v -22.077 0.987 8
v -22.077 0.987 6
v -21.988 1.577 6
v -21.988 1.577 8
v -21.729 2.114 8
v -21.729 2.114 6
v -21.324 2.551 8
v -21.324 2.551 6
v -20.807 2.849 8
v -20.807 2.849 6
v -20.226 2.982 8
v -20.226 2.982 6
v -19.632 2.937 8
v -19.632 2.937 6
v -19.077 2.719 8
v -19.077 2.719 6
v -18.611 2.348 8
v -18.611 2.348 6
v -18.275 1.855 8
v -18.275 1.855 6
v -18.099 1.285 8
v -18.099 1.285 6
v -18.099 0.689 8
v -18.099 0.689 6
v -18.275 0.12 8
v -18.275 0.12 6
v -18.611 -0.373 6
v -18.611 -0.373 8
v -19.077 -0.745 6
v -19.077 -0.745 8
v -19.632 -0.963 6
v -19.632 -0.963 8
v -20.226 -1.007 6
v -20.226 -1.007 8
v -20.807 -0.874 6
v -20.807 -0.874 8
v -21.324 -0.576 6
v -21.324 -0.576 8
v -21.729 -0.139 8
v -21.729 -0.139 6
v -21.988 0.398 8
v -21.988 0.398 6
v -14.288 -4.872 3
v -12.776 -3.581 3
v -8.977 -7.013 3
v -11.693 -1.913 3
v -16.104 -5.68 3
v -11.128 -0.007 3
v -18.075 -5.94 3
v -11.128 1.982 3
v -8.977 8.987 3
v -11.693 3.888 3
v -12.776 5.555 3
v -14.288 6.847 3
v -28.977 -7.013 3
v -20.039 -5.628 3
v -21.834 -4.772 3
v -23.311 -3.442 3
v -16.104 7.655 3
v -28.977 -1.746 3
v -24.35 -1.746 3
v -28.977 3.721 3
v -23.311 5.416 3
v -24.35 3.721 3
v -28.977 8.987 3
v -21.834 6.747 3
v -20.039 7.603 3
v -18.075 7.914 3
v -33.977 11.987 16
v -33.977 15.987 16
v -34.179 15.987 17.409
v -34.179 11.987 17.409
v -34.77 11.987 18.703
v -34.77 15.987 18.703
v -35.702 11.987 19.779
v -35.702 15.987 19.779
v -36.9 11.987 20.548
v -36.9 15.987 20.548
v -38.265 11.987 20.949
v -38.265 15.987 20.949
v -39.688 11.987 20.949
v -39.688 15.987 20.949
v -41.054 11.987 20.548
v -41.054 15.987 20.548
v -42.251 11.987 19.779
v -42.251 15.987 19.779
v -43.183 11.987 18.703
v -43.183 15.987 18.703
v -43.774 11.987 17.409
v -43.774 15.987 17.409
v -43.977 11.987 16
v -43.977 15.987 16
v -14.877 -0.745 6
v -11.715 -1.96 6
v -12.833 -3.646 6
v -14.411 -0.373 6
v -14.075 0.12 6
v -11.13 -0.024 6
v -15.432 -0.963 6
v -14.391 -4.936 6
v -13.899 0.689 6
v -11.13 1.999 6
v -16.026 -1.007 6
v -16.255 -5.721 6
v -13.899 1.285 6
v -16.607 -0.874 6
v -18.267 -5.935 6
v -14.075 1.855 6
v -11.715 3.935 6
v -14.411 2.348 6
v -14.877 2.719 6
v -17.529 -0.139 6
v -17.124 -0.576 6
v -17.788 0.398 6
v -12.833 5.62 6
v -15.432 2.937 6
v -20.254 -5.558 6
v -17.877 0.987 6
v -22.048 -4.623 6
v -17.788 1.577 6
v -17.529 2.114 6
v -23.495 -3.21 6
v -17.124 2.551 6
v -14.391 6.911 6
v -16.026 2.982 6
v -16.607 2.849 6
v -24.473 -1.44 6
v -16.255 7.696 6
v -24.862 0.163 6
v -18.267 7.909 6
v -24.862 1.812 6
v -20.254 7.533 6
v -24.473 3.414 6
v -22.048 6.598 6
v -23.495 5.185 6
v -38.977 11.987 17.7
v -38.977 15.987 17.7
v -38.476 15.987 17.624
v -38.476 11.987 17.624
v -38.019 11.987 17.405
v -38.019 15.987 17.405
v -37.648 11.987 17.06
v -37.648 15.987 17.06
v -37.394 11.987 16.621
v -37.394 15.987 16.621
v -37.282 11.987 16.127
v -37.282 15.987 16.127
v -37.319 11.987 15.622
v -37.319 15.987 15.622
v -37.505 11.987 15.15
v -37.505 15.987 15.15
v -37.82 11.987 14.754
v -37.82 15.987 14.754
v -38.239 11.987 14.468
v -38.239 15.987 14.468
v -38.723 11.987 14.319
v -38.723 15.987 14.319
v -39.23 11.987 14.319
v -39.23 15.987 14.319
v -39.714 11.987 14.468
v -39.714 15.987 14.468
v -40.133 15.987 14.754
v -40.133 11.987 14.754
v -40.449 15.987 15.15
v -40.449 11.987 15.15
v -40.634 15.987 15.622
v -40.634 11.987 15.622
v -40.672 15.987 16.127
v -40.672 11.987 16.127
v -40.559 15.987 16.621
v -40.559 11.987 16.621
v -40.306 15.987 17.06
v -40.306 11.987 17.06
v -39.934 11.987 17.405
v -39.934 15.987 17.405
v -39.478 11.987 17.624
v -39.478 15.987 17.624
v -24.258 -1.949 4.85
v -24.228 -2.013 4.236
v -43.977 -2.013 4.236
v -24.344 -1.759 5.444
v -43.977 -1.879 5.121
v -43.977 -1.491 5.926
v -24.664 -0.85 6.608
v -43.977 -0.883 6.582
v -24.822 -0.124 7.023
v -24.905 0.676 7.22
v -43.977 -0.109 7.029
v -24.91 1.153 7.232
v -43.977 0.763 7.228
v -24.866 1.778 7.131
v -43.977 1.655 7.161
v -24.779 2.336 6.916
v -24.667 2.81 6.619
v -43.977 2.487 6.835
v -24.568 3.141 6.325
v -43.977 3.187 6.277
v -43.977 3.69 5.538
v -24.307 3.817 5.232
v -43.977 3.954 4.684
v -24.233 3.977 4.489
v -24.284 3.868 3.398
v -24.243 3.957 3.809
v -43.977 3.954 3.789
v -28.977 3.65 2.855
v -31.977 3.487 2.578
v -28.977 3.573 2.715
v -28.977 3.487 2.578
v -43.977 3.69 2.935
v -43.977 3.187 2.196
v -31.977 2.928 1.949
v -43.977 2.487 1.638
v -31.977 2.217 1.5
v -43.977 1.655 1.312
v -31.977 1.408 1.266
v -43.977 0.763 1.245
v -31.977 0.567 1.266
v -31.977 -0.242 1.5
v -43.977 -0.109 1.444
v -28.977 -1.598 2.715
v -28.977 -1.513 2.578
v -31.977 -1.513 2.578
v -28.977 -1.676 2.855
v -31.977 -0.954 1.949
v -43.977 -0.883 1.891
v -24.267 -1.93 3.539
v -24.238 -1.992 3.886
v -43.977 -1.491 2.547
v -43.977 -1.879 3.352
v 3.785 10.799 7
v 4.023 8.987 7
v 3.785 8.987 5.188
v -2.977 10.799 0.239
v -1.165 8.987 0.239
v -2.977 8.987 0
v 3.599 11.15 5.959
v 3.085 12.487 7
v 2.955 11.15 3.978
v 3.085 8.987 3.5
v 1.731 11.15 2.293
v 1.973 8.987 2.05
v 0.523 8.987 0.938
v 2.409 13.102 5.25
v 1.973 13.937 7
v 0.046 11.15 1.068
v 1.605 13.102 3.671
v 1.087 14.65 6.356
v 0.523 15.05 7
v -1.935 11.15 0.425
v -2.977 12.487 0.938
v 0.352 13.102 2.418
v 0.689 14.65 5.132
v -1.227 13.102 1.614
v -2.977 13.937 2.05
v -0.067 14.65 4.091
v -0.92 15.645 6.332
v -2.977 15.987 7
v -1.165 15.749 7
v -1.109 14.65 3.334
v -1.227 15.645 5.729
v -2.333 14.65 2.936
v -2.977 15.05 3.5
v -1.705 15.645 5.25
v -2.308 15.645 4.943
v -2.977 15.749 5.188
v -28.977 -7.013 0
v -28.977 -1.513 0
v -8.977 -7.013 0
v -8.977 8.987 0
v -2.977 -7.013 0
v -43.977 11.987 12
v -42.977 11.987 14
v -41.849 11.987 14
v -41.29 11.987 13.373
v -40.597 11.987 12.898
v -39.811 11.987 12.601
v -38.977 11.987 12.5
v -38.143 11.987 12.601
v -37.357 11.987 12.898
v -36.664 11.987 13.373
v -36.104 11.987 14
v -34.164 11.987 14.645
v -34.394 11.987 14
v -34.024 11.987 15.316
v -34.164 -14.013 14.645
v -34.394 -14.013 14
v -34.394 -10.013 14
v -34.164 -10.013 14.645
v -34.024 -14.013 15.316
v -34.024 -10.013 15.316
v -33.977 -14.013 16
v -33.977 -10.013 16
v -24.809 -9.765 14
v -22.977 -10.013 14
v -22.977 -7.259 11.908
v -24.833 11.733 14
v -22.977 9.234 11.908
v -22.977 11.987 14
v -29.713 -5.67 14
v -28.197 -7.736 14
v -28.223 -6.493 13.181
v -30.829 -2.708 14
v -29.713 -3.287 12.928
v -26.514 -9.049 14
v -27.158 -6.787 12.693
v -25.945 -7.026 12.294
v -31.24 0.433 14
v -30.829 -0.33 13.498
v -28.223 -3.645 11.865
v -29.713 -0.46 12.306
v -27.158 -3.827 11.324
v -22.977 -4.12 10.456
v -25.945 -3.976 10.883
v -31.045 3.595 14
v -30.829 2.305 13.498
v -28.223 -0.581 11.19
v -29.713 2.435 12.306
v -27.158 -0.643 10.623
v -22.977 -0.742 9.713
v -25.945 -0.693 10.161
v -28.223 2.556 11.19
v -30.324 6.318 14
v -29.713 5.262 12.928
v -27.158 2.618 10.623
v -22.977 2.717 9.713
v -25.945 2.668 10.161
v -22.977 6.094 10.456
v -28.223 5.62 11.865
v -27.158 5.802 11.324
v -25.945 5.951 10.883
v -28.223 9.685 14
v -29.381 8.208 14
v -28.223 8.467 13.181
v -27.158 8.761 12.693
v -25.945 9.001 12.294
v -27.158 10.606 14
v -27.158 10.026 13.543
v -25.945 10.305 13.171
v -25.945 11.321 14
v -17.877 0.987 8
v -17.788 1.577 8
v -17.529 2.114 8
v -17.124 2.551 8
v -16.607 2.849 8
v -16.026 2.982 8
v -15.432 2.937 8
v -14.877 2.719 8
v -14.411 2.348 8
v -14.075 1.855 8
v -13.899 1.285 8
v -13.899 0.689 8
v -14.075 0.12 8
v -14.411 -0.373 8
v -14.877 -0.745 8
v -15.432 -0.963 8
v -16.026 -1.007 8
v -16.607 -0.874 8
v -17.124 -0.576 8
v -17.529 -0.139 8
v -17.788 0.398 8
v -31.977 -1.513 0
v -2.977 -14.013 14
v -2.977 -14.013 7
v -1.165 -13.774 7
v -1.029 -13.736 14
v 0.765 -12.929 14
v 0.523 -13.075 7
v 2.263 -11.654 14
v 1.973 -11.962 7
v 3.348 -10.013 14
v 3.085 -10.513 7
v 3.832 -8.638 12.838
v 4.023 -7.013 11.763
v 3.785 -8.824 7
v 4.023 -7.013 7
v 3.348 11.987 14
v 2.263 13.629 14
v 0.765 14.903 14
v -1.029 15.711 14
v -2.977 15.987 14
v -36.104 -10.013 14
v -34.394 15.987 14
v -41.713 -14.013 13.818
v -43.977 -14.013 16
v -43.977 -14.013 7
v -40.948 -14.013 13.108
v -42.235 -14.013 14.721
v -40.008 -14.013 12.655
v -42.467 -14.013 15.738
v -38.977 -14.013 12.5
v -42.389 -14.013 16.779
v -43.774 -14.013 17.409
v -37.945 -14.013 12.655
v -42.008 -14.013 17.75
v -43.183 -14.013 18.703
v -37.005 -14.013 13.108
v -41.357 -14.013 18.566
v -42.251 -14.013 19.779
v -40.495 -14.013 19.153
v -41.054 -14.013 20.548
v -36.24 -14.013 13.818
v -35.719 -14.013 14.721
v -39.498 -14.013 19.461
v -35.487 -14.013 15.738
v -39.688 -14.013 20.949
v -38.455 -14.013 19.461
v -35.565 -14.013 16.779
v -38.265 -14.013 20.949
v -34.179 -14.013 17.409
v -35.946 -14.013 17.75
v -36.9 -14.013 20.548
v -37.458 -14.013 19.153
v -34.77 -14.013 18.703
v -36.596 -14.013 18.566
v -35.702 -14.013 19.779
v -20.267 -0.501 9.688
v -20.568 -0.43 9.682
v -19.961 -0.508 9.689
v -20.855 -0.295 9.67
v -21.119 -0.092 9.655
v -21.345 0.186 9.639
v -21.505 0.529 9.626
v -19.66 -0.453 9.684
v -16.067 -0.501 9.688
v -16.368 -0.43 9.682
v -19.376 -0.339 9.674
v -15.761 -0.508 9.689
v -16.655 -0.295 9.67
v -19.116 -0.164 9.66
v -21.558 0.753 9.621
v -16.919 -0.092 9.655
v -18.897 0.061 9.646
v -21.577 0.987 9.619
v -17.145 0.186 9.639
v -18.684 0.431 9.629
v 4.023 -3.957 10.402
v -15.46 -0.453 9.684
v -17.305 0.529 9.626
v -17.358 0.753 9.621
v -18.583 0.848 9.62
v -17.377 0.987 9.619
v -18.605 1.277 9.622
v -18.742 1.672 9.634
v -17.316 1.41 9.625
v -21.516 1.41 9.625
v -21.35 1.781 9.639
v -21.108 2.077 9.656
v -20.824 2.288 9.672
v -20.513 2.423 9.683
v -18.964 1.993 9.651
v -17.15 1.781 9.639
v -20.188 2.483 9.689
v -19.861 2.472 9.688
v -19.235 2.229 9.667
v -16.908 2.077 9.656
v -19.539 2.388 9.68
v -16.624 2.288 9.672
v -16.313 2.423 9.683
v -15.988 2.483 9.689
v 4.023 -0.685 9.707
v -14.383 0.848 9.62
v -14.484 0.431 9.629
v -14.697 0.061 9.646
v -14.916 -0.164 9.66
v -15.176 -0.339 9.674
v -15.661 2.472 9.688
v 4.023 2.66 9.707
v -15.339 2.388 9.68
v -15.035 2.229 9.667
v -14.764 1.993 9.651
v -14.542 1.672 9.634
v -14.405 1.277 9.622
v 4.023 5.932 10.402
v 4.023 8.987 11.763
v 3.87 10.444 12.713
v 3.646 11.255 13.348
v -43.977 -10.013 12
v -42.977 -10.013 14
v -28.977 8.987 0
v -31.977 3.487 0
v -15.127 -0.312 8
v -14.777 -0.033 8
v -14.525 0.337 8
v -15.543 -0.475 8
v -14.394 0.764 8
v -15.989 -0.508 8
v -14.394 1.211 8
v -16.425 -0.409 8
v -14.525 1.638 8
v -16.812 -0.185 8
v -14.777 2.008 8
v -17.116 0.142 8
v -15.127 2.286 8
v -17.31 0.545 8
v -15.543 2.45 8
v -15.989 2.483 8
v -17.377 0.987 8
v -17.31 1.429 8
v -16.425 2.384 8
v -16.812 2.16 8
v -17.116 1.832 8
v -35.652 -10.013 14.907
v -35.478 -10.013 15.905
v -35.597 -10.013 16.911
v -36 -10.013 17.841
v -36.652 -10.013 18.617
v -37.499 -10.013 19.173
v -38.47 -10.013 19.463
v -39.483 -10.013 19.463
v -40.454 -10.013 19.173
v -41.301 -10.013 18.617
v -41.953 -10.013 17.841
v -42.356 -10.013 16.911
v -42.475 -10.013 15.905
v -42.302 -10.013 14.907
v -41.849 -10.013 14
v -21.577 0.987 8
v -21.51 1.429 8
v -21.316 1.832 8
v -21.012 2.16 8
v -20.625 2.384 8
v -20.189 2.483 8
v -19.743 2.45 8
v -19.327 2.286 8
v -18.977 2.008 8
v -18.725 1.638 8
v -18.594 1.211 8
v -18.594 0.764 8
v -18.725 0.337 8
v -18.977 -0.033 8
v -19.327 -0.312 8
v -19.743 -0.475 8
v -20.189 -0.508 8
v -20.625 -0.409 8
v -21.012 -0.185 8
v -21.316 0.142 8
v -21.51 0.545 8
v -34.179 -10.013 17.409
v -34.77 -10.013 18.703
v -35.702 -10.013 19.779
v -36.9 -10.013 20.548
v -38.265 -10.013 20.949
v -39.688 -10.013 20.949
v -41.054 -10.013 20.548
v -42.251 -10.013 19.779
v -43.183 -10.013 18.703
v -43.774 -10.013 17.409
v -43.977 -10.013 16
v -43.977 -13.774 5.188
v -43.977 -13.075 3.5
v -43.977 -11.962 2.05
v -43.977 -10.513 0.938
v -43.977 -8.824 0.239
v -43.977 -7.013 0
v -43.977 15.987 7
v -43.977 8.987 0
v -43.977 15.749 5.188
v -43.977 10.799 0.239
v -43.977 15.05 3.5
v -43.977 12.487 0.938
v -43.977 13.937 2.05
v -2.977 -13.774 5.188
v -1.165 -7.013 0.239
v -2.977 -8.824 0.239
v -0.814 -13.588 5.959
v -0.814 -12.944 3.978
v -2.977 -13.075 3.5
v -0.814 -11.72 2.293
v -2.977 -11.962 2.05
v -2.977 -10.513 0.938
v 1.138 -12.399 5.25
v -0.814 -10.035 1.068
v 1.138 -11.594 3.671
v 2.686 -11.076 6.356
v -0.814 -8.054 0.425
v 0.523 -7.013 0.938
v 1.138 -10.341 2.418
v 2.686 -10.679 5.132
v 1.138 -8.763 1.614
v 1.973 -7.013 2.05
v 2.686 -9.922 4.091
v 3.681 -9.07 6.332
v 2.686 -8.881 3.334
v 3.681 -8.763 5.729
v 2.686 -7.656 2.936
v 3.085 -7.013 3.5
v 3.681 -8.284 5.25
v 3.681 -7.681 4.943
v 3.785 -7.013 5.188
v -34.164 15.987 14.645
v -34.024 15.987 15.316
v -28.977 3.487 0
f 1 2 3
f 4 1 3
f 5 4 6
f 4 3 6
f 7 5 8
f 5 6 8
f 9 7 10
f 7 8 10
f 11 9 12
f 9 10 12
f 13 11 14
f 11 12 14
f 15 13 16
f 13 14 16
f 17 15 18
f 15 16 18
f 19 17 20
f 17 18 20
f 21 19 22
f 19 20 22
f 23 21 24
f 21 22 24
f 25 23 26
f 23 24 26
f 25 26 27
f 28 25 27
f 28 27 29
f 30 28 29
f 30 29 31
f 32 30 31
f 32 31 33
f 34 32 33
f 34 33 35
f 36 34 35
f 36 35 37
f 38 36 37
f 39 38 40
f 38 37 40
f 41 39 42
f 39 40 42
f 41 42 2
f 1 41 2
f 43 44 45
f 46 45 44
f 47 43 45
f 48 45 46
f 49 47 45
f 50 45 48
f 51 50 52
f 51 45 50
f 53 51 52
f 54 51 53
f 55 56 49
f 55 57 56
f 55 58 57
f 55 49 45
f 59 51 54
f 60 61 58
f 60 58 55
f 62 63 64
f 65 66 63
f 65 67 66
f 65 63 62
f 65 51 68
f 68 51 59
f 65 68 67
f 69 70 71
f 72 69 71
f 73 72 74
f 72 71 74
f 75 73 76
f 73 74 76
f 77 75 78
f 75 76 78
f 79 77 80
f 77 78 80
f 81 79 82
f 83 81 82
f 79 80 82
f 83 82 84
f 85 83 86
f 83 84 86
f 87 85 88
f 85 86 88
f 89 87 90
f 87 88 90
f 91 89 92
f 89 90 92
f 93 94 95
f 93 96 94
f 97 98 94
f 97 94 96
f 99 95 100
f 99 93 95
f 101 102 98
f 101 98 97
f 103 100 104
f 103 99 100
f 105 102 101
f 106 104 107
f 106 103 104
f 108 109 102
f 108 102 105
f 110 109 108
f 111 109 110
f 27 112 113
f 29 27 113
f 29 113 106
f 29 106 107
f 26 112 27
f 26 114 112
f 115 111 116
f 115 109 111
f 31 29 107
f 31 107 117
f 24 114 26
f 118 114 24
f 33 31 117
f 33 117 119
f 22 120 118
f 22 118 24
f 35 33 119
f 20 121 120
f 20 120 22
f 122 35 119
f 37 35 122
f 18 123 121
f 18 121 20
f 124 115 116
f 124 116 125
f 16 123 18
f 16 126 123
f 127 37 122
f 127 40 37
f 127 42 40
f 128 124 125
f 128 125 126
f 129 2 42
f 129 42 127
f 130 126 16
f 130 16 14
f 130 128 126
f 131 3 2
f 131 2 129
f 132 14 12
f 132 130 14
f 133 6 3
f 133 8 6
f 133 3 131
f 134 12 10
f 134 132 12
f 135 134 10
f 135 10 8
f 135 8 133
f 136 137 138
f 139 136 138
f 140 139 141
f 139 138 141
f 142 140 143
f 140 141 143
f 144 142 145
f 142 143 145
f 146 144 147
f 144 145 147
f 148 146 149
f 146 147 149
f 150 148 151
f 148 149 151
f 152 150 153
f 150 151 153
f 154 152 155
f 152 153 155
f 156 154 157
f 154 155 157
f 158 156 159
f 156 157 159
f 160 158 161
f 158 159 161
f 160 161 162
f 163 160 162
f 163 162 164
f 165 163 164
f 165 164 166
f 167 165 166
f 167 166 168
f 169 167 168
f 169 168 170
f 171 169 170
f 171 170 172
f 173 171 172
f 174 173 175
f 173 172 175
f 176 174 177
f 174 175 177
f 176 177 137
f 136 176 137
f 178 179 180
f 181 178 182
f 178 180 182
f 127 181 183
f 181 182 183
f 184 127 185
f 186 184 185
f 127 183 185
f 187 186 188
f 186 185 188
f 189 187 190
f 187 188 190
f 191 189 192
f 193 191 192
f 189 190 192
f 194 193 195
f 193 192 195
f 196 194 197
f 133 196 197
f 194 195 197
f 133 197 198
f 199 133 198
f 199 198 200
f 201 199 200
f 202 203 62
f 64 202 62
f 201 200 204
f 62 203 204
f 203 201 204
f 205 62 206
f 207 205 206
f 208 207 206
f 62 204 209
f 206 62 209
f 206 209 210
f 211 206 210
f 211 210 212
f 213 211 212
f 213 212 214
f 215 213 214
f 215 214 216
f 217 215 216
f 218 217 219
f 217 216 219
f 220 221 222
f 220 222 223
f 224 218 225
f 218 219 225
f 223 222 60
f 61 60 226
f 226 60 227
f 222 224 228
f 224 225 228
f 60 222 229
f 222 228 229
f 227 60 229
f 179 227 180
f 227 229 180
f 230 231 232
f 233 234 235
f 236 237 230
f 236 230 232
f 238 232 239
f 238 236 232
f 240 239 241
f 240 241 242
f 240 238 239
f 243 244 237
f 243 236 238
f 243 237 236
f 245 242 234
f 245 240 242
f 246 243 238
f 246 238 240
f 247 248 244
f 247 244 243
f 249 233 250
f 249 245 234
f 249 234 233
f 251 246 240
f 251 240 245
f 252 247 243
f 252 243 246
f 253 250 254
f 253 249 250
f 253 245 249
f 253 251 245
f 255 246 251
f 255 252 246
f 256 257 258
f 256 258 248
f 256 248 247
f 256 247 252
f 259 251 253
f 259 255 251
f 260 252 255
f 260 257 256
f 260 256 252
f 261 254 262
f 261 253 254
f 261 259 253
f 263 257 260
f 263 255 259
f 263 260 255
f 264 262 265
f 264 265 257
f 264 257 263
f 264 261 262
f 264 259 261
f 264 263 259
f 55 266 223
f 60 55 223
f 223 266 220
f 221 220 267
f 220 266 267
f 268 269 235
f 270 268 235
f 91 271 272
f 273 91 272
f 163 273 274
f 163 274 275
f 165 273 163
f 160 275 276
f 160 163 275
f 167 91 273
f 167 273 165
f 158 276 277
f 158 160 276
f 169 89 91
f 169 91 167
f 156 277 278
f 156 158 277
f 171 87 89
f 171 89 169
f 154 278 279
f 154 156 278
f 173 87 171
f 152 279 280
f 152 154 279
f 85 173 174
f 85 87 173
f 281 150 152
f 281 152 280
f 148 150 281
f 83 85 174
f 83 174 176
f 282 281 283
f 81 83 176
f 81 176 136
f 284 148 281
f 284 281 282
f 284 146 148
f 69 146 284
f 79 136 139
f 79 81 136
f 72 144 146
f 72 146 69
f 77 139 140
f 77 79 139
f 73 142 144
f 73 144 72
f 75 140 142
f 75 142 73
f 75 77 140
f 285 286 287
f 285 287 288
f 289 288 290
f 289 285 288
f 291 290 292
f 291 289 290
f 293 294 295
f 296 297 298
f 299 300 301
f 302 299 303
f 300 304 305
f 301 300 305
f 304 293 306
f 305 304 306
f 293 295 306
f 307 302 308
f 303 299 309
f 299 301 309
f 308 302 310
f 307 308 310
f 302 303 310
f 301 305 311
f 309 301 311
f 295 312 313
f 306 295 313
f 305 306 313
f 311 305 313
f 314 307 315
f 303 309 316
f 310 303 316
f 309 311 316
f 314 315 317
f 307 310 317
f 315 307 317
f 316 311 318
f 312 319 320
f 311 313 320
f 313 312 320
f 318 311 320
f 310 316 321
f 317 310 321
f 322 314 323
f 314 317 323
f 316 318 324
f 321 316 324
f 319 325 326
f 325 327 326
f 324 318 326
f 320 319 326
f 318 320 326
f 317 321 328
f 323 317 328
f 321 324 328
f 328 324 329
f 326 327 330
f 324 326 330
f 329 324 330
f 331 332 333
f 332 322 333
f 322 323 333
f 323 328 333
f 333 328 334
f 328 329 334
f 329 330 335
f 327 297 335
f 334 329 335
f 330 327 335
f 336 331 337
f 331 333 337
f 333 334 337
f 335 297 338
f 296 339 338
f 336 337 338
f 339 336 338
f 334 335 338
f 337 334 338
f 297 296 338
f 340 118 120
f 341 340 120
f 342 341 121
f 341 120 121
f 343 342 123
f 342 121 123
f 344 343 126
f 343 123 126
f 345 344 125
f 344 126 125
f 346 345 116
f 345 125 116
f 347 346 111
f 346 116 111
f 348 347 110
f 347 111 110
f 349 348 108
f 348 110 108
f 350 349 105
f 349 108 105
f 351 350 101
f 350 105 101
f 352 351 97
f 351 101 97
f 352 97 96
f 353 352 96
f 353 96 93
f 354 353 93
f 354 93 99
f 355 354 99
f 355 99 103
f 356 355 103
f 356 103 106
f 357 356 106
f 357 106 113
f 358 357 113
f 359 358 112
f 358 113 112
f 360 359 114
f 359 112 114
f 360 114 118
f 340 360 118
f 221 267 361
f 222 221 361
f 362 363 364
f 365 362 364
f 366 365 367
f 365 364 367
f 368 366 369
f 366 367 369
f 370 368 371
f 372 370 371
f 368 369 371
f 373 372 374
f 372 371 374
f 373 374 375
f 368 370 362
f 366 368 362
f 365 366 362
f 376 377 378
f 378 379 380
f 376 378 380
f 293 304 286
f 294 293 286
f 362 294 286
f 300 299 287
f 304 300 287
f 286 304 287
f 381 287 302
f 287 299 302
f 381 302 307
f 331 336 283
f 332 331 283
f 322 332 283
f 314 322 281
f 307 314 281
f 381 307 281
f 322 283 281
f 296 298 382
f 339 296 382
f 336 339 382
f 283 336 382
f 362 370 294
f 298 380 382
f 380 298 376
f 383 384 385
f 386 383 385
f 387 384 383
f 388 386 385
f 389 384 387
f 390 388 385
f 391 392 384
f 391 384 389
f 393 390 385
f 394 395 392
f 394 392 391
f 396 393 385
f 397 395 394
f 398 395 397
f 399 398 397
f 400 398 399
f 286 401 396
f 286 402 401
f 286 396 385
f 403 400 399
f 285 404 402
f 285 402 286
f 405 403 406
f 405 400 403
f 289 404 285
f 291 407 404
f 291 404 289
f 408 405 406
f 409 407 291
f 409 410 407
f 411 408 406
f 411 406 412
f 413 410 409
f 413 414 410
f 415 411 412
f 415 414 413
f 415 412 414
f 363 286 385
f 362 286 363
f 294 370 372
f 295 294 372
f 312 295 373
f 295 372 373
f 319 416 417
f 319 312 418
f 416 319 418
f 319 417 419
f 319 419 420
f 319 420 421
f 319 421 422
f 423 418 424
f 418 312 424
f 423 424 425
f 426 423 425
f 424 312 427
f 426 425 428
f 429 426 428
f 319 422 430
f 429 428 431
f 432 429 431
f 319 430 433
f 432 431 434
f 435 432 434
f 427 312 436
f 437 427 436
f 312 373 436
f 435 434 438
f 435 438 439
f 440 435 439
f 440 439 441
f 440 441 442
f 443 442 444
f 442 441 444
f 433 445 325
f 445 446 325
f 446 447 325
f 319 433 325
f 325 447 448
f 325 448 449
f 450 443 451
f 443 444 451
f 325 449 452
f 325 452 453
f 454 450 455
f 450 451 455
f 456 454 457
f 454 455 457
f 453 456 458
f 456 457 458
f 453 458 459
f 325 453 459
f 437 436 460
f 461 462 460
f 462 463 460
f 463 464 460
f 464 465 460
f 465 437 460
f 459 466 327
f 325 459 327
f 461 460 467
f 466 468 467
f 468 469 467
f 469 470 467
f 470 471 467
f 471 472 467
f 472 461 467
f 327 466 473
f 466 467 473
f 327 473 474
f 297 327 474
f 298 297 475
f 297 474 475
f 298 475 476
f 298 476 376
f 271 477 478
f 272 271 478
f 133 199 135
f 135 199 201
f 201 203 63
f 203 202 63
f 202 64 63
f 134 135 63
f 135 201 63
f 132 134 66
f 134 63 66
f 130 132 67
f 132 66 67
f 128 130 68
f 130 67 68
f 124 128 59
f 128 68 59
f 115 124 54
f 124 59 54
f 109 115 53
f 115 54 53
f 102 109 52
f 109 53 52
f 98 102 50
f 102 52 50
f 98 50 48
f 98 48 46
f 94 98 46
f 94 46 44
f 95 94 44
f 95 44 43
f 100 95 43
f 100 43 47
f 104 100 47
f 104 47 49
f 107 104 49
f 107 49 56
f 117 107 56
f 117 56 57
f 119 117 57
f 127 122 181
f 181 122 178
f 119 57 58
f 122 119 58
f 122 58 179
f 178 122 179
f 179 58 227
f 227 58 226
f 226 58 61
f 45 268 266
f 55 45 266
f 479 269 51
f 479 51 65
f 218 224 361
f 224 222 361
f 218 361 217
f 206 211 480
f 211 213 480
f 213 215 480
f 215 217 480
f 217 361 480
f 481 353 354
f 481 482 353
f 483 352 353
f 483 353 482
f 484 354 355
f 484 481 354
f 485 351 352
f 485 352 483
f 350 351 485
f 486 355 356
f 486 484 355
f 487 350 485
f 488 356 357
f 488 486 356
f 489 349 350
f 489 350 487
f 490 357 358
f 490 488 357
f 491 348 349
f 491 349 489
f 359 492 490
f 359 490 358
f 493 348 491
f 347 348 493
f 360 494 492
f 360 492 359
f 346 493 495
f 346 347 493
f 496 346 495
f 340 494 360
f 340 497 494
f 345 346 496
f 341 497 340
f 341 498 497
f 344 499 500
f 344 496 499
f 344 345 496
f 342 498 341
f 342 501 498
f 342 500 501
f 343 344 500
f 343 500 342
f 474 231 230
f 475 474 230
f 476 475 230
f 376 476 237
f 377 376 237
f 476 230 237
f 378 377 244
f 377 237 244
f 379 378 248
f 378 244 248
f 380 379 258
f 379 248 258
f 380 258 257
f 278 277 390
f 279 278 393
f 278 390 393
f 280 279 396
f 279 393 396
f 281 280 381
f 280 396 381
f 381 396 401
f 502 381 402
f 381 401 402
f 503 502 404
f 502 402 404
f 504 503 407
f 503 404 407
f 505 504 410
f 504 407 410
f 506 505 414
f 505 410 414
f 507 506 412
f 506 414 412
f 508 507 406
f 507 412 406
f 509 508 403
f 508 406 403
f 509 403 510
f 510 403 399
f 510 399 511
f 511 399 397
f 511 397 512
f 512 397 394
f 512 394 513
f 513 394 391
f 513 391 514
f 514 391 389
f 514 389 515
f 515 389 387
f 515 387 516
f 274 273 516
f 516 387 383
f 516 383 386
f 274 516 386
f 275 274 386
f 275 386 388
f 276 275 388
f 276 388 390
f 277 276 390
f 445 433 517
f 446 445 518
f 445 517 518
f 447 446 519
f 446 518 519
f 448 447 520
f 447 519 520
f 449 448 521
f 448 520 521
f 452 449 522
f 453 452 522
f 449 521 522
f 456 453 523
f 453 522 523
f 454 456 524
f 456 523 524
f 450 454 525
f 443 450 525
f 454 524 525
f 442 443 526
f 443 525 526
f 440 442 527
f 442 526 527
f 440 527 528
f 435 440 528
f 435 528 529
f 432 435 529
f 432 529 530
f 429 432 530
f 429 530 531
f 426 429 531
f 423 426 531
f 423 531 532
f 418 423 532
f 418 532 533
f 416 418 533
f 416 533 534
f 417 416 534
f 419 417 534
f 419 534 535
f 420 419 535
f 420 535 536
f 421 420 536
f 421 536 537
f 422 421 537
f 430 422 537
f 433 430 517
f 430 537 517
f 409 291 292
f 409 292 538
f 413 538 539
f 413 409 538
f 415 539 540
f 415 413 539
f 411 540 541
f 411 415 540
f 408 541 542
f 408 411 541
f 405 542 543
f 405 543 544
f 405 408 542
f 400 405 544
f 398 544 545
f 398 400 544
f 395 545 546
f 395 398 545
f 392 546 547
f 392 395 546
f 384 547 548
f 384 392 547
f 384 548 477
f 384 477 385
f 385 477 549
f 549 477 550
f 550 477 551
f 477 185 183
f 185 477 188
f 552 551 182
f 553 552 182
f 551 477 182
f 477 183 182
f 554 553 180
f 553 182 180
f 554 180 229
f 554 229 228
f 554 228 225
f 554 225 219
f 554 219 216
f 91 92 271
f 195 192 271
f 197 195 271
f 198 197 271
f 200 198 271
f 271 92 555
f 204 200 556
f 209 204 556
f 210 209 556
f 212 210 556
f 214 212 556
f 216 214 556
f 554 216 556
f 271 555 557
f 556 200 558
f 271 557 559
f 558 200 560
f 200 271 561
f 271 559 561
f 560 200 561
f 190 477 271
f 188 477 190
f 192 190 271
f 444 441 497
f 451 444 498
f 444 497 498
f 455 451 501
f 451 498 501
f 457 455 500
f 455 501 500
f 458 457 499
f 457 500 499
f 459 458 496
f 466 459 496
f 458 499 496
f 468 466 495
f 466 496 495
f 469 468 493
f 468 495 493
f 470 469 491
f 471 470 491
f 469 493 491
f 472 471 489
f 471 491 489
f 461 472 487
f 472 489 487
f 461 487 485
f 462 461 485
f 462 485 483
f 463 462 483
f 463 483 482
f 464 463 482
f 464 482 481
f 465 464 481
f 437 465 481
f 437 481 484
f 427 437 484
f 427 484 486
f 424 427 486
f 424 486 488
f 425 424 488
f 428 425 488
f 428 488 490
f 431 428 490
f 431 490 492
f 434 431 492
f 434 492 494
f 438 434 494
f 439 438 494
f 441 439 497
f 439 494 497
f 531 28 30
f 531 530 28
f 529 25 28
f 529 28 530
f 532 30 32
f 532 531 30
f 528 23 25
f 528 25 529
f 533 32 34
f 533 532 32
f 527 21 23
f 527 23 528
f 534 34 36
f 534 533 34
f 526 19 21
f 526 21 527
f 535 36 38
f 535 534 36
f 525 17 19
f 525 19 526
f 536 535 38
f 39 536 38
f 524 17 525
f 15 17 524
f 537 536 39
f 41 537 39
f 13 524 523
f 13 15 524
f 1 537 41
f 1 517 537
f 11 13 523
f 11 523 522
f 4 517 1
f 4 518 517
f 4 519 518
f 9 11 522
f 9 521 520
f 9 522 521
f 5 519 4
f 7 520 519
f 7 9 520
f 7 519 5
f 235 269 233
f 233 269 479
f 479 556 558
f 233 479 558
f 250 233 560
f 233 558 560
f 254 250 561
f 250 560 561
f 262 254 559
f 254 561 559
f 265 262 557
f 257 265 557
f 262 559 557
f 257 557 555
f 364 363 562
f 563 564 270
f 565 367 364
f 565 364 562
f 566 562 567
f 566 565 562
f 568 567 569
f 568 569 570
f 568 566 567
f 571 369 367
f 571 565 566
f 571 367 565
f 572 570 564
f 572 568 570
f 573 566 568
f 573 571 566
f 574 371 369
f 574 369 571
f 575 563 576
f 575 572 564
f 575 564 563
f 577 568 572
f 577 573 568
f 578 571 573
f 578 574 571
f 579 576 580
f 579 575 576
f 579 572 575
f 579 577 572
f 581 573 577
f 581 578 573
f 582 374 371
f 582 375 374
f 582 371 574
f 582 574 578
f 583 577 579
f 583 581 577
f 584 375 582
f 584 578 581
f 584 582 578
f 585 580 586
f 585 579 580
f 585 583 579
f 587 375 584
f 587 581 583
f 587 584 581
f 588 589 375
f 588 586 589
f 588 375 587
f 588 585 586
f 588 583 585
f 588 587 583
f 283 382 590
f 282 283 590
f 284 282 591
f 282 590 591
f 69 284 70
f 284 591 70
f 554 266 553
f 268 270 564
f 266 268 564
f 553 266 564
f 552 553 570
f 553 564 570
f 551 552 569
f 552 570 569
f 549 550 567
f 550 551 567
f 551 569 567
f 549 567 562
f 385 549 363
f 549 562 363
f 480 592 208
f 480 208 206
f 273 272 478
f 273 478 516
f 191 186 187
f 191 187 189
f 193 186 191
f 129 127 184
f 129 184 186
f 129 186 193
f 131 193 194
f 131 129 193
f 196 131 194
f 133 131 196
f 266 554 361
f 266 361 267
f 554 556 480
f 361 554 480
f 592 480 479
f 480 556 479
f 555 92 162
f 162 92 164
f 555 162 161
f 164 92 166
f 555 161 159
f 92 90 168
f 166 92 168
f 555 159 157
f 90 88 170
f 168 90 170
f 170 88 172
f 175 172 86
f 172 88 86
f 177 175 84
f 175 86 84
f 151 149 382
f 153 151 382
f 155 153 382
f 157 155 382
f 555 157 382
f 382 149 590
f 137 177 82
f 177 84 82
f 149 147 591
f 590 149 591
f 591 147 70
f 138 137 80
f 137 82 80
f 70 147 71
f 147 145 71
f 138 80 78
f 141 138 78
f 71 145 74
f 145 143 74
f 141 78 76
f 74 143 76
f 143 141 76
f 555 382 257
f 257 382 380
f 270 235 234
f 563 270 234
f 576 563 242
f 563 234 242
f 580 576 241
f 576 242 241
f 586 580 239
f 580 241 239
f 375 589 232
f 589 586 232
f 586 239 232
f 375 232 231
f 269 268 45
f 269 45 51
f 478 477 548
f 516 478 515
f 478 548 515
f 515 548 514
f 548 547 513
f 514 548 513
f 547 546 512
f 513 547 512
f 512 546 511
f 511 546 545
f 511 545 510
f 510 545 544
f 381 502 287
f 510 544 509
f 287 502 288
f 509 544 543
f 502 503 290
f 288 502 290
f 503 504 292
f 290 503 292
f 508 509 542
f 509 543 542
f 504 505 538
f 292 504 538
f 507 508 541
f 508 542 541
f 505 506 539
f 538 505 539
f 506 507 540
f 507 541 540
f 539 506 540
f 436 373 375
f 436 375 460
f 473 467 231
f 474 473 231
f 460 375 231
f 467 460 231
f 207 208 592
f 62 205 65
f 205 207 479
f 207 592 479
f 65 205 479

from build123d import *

# Parameters (mm, degrees)
CROQUIS1_W                  = 48
CROQUIS1_H                  = 30
SALIENTE_EXTRUIR1_DEPTH     = 14
CORTAR_EXTRUIR1_DEPTH       = 37
REDONDEO2_R                 = 7
CROQUIS3_W                  = 20
CROQUIS3_H                  = 16
CORTAR_EXTRUIR2_DEPTH       = 3
CROQUIS5_R                  = 1.5
CORTAR_EXTRUIR3_DEPTH       = 12
CROQUIS10_R                 = 6.927737764
CORTAR_EXTRUIR9_DEPTH       = 3
CORTAR_EXTRUIR10_REACH      = 54.494
CORTAR_EXTRUIR10_END_RADIUS = 6.927737764
CROQUIS11_R                 = 3
SALIENTE_EXTRUIR5_DEPTH     = 4
CORTAR_EXTRUIR14_REACH      = 59.227
CROQUIS12_R                 = 3.5
CORTAR_EXTRUIR16_DEPTH      = 22
CROQUIS16_R                 = 2
CORTAR_EXTRUIR17_DEPTH      = 2
CROQUIS17_W                 = 3
CROQUIS17_H                 = 5
CORTAR_EXTRUIR18_DEPTH      = 3
CROQUIS18_R                 = 1.7
CORTAR_EXTRUIR19_DEPTH      = 4
REDONDEO3_R                 = 10


with BuildPart() as part:
    # Croquis1 → Saliente-Extruir1 (new body)
    with BuildSketch(Plane.XY):
        with Locations((-19.976765257, 0.987352556)):
            Rectangle(CROQUIS1_W, CROQUIS1_H)
    extrude(amount=SALIENTE_EXTRUIR1_DEPTH)

    # Croquis2 → Cortar-Extruir1 (cut)
    with BuildSketch(Plane(origin=(4.023234743, 0, 0), x_dir=(0, 0, -1), z_dir=(1, 0, 0))):
        with BuildLine():
            ThreePointArc((-14, -10.012647444), (-9.618950039, 0.987352556), (-14, 11.987352556))
            Line((-14, 11.987352556), (-14, -10.012647444))
        make_face()
    extrude(amount=-CORTAR_EXTRUIR1_DEPTH, mode=Mode.SUBTRACT)

    # Redondeo2
    # the kernel refuses this fillet: 7 mm, written as the material it takes off along each edge
    with BuildSketch(Plane(origin=(-2.976765257, -7.012647444, 7), x_dir=(0, 0, -1), z_dir=(1, 0, 0))) as redondeo2_piece_1_section:
        Polygon((0, 0), (REDONDEO2_R, 0), (REDONDEO2_R, -REDONDEO2_R), (0, -REDONDEO2_R), align=None)
    redondeo2_piece_1 = extrude(amount=REDONDEO2_R, mode=Mode.PRIVATE)
    redondeo2_piece_1 = redondeo2_piece_1 - Plane(origin=(-2.976765257, -7.012647444, 7), x_dir=(0, 0.7071067811865475, 0.7071067811865475), z_dir=(1, 0, 0)) * Sphere(REDONDEO2_R, mode=Mode.PRIVATE)
    add(redondeo2_piece_1, mode=Mode.SUBTRACT)
    with BuildSketch(Plane(origin=(-2.976765257, 8.987352556, 7), x_dir=(1, 0, 0), z_dir=(0, 1, 0))) as redondeo2_piece_2_section:
        Polygon((0, 0), (REDONDEO2_R, 0), (REDONDEO2_R, REDONDEO2_R), (0, REDONDEO2_R), align=None)
    redondeo2_piece_2 = extrude(amount=REDONDEO2_R, mode=Mode.PRIVATE)
    redondeo2_piece_2 = redondeo2_piece_2 - Plane(origin=(-2.976765257, 8.987352556, 7), x_dir=(-0.7071067811865475, 0, 0.7071067811865475), z_dir=(0, 1, 0)) * Sphere(REDONDEO2_R, mode=Mode.PRIVATE)
    add(redondeo2_piece_2, mode=Mode.SUBTRACT)
    with BuildSketch(Plane(origin=(-2.976765257, -14.012647444, 0), x_dir=(0, 1, 0), z_dir=(-1, 0, 0))) as redondeo2_piece_3:
        with BuildLine():
            CenterArc((REDONDEO2_R, -REDONDEO2_R), REDONDEO2_R, 90, 90)
            Line((0, -REDONDEO2_R), (0, 0))
            Line((0, 0), (REDONDEO2_R, 0))
        make_face()
    extrude(amount=58.5, mode=Mode.SUBTRACT)
    with BuildSketch(Plane(origin=(4.023234743, 8.987352556, 0), x_dir=(0, 0, 1), z_dir=(0, -1, 0))) as redondeo2_piece_4:
        with BuildLine():
            CenterArc((REDONDEO2_R, REDONDEO2_R), REDONDEO2_R, 180, 90)
            Line((0, REDONDEO2_R), (0, 0))
            Line((0, 0), (REDONDEO2_R, 0))
        make_face()
    extrude(amount=16, mode=Mode.SUBTRACT)
    with BuildSketch(Plane(origin=(-61.476765257, 15.987352556, 0), x_dir=(0, 0, 1), z_dir=(1, 0, 0))) as redondeo2_piece_5:
        with BuildLine():
            CenterArc((REDONDEO2_R, REDONDEO2_R), REDONDEO2_R, 180, 90)
            Line((0, REDONDEO2_R), (0, 0))
            Line((0, 0), (REDONDEO2_R, 0))
        make_face()
    extrude(amount=58.5, mode=Mode.SUBTRACT)
    with BuildSketch(Plane(origin=(4.023234743, 15.987352556, 7), x_dir=(-1, 0, 0), z_dir=(0, 0, 1)), Plane(origin=(4.023234743, -14.012647444, 7), x_dir=(0, 1, 0), z_dir=(0, 0, 1))) as redondeo2_piece_6:
        with BuildLine():
            CenterArc((REDONDEO2_R, REDONDEO2_R), REDONDEO2_R, 180, 90)
            Line((0, REDONDEO2_R), (0, 0))
            Line((0, 0), (REDONDEO2_R, 0))
        make_face()
    extrude(amount=24.5, mode=Mode.SUBTRACT)

    # Croquis3 → Cortar-Extruir2 (cut)
    with BuildSketch(Plane(origin=(0, 0, 0), x_dir=(-1, 0, 0), z_dir=(0, 0, -1))):
        with Locations((18.976765257, 0.987352556)):
            Rectangle(CROQUIS3_W, CROQUIS3_H)
    extrude(amount=-CORTAR_EXTRUIR2_DEPTH, mode=Mode.SUBTRACT)

    # Croquis5 → Cortar-Extruir3 (cut)
    with BuildSketch(Plane(origin=(0, 0, 0), x_dir=(-1, 0, 0), z_dir=(0, 0, -1))):
        with Locations((20.076765257, 0.987352556)):
            Circle(CROQUIS5_R)
        with Locations((15.876765257, 0.987352556)):
            Circle(CROQUIS5_R)
    extrude(amount=-CORTAR_EXTRUIR3_DEPTH, mode=Mode.SUBTRACT)

    # Croquis10 → Cortar-Extruir9 (cut)
    with BuildSketch(Plane(origin=(0, 0, 3), x_dir=(-1, 0, 0), z_dir=(0, 0, -1))):
        with Locations((17.983902927, 0.987352556)):
            Circle(CROQUIS10_R)
    extrude(amount=-CORTAR_EXTRUIR9_DEPTH, mode=Mode.SUBTRACT)

    # Cortar-Extruir10: up to this cylinder (the profile starts outside it)
    cortar_extruir10_end = Plane(origin=(-17.983902927, 0.987352556, 4.236484), z_dir=(0, 0, -1)) * Cylinder(CORTAR_EXTRUIR10_END_RADIUS, 123.843475528, mode=Mode.PRIVATE)
    # Croquis11 → Cortar-Extruir10 (cut, up to the surface)
    with BuildSketch(Plane.ZY.offset(43.976765257), mode=Mode.PRIVATE) as cortar_extruir10_sk1:
        with Locations(Location((4.236484056, 0.987352556, 0), (0, 0, 270))):
            Circle(CROQUIS11_R)
    cortar_extruir10_tool1 = extrude(cortar_extruir10_sk1.sketch, amount=-CORTAR_EXTRUIR10_REACH, mode=Mode.PRIVATE) - cortar_extruir10_end
    add(cortar_extruir10_tool1.solids().sort_by_distance((-43.976765, 0.987353, 4.236484))[0], mode=Mode.SUBTRACT)

    # Croquis14 → Saliente-Extruir5 (add)
    with BuildSketch(Plane.XZ.offset(14.012647444)):
        with BuildLine():
            ThreePointArc((-33.976765257, 16), (-38.976765257, 21), (-43.976765257, 16))
            ThreePointArc((-43.976765257, 16), (-43.871296822, 14.978451782), (-43.559340952, 14))
            Line((-43.559340952, 14), (-34.394189562, 14))
            ThreePointArc((-34.394189562, 14), (-34.082233692, 14.978451782), (-33.976765257, 16))
        make_face()
        with BuildLine():
            Line((-34.394189562, 14), (-43.559340952, 14))
            ThreePointArc((-43.559340952, 14), (-38.976765257, 11), (-34.394189562, 14))
        make_face()
        with BuildLine():
            ThreePointArc((-43.559340952, 14), (-43.871296822, 14.978451782), (-43.976765257, 16))
            Line((-43.976765257, 16), (-43.976765257, 14))
            Line((-43.976765257, 14), (-43.559340952, 14))
        make_face()
    saliente_extruir5 = extrude(amount=-SALIENTE_EXTRUIR5_DEPTH)

    # Simetría1: Saliente-Extruir5 across plane
    add(saliente_extruir5.mirror(Plane.ZX.offset(0.987352556)))

    # Cortar-Extruir14: up to this face of the body (flat: up to its plane)
    cortar_extruir14_end = Plane(part.part.faces().sort_by_distance((-38.999365489, 11.987352556, 17.080483699))[0])
    # Croquis12 → Cortar-Extruir14 (cut, up to the picked face)
    with BuildSketch(Plane.XZ.offset(14.012647444), mode=Mode.PRIVATE) as cortar_extruir14_sk1:
        with Locations(Location((-38.976765257, 16, 0), (0, 0, 270))):
            Circle(CROQUIS12_R)
    cortar_extruir14_tool1 = split(extrude(cortar_extruir14_sk1.sketch, amount=-CORTAR_EXTRUIR14_REACH, mode=Mode.PRIVATE), bisect_by=cortar_extruir14_end, keep=Keep.BOTH, mode=Mode.PRIVATE)
    add(cortar_extruir14_tool1.solids().sort_by(Axis((-38.976765, -14.012647, 16), (0, 1, 0)))[0], mode=Mode.SUBTRACT)

    # Croquis15 → Cortar-Extruir16 (cut)
    with BuildSketch(Plane.XZ.offset(10.012647444)):
        Polygon((-43.976765257, 16), (-43.976765257, 12), (-41.976765257, 16), align=None)
    extrude(amount=-CORTAR_EXTRUIR16_DEPTH, mode=Mode.SUBTRACT)

    # Croquis16 → Cortar-Extruir17 (cut)
    with BuildSketch(Plane(origin=(0, 0, 6), x_dir=(-1, 0, 0), z_dir=(0, 0, -1))):
        with Locations((15.876765257, 0.987352556)):
            Circle(CROQUIS16_R)
        with Locations((20.076765257, 0.987352556)):
            Circle(CROQUIS16_R)
    extrude(amount=-CORTAR_EXTRUIR17_DEPTH, mode=Mode.SUBTRACT)

    # Croquis17 → Cortar-Extruir18 (cut)
    with BuildSketch(Plane(origin=(0, 0, 0), x_dir=(-1, 0, 0), z_dir=(0, 0, -1))):
        with Locations((30.476765257, 0.987352556)):
            Rectangle(CROQUIS17_W, CROQUIS17_H)
    extrude(amount=-CORTAR_EXTRUIR18_DEPTH, mode=Mode.SUBTRACT)

    # Croquis18 → Cortar-Extruir19 (cut)
    with BuildSketch(Plane(origin=(0, 15.987352556, 0), x_dir=(1, 0, 0), z_dir=(0, 1, 0))):
        with Locations(Location((-38.976765257, -16, 0), (0, 0, 270))):
            Circle(CROQUIS18_R)
    extrude(amount=-CORTAR_EXTRUIR19_DEPTH, mode=Mode.SUBTRACT)

    # Redondeo3
    # the kernel refuses this fillet: 10 mm, written as the material it adds along each edge
    with BuildSketch(Plane(origin=(-32.976765257, 0.987352556, 25.618950039), x_dir=(0, -0.7314644805706508, 0.6818795448343558), z_dir=(0, 0.6818795448343558, 0.7314644805706508))) as redondeo3_piece_1_section:
        with BuildLine():
            CenterArc((16 - REDONDEO3_R, REDONDEO3_R), REDONDEO3_R, 270, 90)
            Line((16 - REDONDEO3_R, 0), (16, 0))
            Line((16, 0), (16, REDONDEO3_R))
        make_face()
    redondeo3_piece_1 = revolve(axis=Axis((-32.976765257, 0.987352556, 25.618950039), (1, 0, 0)), revolution_arc=265.981384943, mode=Mode.PRIVATE)
    redondeo3_piece_1 = split(redondeo3_piece_1, bisect_by=Plane(origin=(-29.991953526, 0.987352592, 14), z_dir=(0, 0, -1)), keep=Keep.TOP, mode=Mode.PRIVATE)
    add(redondeo3_piece_1)


solid = part.part
